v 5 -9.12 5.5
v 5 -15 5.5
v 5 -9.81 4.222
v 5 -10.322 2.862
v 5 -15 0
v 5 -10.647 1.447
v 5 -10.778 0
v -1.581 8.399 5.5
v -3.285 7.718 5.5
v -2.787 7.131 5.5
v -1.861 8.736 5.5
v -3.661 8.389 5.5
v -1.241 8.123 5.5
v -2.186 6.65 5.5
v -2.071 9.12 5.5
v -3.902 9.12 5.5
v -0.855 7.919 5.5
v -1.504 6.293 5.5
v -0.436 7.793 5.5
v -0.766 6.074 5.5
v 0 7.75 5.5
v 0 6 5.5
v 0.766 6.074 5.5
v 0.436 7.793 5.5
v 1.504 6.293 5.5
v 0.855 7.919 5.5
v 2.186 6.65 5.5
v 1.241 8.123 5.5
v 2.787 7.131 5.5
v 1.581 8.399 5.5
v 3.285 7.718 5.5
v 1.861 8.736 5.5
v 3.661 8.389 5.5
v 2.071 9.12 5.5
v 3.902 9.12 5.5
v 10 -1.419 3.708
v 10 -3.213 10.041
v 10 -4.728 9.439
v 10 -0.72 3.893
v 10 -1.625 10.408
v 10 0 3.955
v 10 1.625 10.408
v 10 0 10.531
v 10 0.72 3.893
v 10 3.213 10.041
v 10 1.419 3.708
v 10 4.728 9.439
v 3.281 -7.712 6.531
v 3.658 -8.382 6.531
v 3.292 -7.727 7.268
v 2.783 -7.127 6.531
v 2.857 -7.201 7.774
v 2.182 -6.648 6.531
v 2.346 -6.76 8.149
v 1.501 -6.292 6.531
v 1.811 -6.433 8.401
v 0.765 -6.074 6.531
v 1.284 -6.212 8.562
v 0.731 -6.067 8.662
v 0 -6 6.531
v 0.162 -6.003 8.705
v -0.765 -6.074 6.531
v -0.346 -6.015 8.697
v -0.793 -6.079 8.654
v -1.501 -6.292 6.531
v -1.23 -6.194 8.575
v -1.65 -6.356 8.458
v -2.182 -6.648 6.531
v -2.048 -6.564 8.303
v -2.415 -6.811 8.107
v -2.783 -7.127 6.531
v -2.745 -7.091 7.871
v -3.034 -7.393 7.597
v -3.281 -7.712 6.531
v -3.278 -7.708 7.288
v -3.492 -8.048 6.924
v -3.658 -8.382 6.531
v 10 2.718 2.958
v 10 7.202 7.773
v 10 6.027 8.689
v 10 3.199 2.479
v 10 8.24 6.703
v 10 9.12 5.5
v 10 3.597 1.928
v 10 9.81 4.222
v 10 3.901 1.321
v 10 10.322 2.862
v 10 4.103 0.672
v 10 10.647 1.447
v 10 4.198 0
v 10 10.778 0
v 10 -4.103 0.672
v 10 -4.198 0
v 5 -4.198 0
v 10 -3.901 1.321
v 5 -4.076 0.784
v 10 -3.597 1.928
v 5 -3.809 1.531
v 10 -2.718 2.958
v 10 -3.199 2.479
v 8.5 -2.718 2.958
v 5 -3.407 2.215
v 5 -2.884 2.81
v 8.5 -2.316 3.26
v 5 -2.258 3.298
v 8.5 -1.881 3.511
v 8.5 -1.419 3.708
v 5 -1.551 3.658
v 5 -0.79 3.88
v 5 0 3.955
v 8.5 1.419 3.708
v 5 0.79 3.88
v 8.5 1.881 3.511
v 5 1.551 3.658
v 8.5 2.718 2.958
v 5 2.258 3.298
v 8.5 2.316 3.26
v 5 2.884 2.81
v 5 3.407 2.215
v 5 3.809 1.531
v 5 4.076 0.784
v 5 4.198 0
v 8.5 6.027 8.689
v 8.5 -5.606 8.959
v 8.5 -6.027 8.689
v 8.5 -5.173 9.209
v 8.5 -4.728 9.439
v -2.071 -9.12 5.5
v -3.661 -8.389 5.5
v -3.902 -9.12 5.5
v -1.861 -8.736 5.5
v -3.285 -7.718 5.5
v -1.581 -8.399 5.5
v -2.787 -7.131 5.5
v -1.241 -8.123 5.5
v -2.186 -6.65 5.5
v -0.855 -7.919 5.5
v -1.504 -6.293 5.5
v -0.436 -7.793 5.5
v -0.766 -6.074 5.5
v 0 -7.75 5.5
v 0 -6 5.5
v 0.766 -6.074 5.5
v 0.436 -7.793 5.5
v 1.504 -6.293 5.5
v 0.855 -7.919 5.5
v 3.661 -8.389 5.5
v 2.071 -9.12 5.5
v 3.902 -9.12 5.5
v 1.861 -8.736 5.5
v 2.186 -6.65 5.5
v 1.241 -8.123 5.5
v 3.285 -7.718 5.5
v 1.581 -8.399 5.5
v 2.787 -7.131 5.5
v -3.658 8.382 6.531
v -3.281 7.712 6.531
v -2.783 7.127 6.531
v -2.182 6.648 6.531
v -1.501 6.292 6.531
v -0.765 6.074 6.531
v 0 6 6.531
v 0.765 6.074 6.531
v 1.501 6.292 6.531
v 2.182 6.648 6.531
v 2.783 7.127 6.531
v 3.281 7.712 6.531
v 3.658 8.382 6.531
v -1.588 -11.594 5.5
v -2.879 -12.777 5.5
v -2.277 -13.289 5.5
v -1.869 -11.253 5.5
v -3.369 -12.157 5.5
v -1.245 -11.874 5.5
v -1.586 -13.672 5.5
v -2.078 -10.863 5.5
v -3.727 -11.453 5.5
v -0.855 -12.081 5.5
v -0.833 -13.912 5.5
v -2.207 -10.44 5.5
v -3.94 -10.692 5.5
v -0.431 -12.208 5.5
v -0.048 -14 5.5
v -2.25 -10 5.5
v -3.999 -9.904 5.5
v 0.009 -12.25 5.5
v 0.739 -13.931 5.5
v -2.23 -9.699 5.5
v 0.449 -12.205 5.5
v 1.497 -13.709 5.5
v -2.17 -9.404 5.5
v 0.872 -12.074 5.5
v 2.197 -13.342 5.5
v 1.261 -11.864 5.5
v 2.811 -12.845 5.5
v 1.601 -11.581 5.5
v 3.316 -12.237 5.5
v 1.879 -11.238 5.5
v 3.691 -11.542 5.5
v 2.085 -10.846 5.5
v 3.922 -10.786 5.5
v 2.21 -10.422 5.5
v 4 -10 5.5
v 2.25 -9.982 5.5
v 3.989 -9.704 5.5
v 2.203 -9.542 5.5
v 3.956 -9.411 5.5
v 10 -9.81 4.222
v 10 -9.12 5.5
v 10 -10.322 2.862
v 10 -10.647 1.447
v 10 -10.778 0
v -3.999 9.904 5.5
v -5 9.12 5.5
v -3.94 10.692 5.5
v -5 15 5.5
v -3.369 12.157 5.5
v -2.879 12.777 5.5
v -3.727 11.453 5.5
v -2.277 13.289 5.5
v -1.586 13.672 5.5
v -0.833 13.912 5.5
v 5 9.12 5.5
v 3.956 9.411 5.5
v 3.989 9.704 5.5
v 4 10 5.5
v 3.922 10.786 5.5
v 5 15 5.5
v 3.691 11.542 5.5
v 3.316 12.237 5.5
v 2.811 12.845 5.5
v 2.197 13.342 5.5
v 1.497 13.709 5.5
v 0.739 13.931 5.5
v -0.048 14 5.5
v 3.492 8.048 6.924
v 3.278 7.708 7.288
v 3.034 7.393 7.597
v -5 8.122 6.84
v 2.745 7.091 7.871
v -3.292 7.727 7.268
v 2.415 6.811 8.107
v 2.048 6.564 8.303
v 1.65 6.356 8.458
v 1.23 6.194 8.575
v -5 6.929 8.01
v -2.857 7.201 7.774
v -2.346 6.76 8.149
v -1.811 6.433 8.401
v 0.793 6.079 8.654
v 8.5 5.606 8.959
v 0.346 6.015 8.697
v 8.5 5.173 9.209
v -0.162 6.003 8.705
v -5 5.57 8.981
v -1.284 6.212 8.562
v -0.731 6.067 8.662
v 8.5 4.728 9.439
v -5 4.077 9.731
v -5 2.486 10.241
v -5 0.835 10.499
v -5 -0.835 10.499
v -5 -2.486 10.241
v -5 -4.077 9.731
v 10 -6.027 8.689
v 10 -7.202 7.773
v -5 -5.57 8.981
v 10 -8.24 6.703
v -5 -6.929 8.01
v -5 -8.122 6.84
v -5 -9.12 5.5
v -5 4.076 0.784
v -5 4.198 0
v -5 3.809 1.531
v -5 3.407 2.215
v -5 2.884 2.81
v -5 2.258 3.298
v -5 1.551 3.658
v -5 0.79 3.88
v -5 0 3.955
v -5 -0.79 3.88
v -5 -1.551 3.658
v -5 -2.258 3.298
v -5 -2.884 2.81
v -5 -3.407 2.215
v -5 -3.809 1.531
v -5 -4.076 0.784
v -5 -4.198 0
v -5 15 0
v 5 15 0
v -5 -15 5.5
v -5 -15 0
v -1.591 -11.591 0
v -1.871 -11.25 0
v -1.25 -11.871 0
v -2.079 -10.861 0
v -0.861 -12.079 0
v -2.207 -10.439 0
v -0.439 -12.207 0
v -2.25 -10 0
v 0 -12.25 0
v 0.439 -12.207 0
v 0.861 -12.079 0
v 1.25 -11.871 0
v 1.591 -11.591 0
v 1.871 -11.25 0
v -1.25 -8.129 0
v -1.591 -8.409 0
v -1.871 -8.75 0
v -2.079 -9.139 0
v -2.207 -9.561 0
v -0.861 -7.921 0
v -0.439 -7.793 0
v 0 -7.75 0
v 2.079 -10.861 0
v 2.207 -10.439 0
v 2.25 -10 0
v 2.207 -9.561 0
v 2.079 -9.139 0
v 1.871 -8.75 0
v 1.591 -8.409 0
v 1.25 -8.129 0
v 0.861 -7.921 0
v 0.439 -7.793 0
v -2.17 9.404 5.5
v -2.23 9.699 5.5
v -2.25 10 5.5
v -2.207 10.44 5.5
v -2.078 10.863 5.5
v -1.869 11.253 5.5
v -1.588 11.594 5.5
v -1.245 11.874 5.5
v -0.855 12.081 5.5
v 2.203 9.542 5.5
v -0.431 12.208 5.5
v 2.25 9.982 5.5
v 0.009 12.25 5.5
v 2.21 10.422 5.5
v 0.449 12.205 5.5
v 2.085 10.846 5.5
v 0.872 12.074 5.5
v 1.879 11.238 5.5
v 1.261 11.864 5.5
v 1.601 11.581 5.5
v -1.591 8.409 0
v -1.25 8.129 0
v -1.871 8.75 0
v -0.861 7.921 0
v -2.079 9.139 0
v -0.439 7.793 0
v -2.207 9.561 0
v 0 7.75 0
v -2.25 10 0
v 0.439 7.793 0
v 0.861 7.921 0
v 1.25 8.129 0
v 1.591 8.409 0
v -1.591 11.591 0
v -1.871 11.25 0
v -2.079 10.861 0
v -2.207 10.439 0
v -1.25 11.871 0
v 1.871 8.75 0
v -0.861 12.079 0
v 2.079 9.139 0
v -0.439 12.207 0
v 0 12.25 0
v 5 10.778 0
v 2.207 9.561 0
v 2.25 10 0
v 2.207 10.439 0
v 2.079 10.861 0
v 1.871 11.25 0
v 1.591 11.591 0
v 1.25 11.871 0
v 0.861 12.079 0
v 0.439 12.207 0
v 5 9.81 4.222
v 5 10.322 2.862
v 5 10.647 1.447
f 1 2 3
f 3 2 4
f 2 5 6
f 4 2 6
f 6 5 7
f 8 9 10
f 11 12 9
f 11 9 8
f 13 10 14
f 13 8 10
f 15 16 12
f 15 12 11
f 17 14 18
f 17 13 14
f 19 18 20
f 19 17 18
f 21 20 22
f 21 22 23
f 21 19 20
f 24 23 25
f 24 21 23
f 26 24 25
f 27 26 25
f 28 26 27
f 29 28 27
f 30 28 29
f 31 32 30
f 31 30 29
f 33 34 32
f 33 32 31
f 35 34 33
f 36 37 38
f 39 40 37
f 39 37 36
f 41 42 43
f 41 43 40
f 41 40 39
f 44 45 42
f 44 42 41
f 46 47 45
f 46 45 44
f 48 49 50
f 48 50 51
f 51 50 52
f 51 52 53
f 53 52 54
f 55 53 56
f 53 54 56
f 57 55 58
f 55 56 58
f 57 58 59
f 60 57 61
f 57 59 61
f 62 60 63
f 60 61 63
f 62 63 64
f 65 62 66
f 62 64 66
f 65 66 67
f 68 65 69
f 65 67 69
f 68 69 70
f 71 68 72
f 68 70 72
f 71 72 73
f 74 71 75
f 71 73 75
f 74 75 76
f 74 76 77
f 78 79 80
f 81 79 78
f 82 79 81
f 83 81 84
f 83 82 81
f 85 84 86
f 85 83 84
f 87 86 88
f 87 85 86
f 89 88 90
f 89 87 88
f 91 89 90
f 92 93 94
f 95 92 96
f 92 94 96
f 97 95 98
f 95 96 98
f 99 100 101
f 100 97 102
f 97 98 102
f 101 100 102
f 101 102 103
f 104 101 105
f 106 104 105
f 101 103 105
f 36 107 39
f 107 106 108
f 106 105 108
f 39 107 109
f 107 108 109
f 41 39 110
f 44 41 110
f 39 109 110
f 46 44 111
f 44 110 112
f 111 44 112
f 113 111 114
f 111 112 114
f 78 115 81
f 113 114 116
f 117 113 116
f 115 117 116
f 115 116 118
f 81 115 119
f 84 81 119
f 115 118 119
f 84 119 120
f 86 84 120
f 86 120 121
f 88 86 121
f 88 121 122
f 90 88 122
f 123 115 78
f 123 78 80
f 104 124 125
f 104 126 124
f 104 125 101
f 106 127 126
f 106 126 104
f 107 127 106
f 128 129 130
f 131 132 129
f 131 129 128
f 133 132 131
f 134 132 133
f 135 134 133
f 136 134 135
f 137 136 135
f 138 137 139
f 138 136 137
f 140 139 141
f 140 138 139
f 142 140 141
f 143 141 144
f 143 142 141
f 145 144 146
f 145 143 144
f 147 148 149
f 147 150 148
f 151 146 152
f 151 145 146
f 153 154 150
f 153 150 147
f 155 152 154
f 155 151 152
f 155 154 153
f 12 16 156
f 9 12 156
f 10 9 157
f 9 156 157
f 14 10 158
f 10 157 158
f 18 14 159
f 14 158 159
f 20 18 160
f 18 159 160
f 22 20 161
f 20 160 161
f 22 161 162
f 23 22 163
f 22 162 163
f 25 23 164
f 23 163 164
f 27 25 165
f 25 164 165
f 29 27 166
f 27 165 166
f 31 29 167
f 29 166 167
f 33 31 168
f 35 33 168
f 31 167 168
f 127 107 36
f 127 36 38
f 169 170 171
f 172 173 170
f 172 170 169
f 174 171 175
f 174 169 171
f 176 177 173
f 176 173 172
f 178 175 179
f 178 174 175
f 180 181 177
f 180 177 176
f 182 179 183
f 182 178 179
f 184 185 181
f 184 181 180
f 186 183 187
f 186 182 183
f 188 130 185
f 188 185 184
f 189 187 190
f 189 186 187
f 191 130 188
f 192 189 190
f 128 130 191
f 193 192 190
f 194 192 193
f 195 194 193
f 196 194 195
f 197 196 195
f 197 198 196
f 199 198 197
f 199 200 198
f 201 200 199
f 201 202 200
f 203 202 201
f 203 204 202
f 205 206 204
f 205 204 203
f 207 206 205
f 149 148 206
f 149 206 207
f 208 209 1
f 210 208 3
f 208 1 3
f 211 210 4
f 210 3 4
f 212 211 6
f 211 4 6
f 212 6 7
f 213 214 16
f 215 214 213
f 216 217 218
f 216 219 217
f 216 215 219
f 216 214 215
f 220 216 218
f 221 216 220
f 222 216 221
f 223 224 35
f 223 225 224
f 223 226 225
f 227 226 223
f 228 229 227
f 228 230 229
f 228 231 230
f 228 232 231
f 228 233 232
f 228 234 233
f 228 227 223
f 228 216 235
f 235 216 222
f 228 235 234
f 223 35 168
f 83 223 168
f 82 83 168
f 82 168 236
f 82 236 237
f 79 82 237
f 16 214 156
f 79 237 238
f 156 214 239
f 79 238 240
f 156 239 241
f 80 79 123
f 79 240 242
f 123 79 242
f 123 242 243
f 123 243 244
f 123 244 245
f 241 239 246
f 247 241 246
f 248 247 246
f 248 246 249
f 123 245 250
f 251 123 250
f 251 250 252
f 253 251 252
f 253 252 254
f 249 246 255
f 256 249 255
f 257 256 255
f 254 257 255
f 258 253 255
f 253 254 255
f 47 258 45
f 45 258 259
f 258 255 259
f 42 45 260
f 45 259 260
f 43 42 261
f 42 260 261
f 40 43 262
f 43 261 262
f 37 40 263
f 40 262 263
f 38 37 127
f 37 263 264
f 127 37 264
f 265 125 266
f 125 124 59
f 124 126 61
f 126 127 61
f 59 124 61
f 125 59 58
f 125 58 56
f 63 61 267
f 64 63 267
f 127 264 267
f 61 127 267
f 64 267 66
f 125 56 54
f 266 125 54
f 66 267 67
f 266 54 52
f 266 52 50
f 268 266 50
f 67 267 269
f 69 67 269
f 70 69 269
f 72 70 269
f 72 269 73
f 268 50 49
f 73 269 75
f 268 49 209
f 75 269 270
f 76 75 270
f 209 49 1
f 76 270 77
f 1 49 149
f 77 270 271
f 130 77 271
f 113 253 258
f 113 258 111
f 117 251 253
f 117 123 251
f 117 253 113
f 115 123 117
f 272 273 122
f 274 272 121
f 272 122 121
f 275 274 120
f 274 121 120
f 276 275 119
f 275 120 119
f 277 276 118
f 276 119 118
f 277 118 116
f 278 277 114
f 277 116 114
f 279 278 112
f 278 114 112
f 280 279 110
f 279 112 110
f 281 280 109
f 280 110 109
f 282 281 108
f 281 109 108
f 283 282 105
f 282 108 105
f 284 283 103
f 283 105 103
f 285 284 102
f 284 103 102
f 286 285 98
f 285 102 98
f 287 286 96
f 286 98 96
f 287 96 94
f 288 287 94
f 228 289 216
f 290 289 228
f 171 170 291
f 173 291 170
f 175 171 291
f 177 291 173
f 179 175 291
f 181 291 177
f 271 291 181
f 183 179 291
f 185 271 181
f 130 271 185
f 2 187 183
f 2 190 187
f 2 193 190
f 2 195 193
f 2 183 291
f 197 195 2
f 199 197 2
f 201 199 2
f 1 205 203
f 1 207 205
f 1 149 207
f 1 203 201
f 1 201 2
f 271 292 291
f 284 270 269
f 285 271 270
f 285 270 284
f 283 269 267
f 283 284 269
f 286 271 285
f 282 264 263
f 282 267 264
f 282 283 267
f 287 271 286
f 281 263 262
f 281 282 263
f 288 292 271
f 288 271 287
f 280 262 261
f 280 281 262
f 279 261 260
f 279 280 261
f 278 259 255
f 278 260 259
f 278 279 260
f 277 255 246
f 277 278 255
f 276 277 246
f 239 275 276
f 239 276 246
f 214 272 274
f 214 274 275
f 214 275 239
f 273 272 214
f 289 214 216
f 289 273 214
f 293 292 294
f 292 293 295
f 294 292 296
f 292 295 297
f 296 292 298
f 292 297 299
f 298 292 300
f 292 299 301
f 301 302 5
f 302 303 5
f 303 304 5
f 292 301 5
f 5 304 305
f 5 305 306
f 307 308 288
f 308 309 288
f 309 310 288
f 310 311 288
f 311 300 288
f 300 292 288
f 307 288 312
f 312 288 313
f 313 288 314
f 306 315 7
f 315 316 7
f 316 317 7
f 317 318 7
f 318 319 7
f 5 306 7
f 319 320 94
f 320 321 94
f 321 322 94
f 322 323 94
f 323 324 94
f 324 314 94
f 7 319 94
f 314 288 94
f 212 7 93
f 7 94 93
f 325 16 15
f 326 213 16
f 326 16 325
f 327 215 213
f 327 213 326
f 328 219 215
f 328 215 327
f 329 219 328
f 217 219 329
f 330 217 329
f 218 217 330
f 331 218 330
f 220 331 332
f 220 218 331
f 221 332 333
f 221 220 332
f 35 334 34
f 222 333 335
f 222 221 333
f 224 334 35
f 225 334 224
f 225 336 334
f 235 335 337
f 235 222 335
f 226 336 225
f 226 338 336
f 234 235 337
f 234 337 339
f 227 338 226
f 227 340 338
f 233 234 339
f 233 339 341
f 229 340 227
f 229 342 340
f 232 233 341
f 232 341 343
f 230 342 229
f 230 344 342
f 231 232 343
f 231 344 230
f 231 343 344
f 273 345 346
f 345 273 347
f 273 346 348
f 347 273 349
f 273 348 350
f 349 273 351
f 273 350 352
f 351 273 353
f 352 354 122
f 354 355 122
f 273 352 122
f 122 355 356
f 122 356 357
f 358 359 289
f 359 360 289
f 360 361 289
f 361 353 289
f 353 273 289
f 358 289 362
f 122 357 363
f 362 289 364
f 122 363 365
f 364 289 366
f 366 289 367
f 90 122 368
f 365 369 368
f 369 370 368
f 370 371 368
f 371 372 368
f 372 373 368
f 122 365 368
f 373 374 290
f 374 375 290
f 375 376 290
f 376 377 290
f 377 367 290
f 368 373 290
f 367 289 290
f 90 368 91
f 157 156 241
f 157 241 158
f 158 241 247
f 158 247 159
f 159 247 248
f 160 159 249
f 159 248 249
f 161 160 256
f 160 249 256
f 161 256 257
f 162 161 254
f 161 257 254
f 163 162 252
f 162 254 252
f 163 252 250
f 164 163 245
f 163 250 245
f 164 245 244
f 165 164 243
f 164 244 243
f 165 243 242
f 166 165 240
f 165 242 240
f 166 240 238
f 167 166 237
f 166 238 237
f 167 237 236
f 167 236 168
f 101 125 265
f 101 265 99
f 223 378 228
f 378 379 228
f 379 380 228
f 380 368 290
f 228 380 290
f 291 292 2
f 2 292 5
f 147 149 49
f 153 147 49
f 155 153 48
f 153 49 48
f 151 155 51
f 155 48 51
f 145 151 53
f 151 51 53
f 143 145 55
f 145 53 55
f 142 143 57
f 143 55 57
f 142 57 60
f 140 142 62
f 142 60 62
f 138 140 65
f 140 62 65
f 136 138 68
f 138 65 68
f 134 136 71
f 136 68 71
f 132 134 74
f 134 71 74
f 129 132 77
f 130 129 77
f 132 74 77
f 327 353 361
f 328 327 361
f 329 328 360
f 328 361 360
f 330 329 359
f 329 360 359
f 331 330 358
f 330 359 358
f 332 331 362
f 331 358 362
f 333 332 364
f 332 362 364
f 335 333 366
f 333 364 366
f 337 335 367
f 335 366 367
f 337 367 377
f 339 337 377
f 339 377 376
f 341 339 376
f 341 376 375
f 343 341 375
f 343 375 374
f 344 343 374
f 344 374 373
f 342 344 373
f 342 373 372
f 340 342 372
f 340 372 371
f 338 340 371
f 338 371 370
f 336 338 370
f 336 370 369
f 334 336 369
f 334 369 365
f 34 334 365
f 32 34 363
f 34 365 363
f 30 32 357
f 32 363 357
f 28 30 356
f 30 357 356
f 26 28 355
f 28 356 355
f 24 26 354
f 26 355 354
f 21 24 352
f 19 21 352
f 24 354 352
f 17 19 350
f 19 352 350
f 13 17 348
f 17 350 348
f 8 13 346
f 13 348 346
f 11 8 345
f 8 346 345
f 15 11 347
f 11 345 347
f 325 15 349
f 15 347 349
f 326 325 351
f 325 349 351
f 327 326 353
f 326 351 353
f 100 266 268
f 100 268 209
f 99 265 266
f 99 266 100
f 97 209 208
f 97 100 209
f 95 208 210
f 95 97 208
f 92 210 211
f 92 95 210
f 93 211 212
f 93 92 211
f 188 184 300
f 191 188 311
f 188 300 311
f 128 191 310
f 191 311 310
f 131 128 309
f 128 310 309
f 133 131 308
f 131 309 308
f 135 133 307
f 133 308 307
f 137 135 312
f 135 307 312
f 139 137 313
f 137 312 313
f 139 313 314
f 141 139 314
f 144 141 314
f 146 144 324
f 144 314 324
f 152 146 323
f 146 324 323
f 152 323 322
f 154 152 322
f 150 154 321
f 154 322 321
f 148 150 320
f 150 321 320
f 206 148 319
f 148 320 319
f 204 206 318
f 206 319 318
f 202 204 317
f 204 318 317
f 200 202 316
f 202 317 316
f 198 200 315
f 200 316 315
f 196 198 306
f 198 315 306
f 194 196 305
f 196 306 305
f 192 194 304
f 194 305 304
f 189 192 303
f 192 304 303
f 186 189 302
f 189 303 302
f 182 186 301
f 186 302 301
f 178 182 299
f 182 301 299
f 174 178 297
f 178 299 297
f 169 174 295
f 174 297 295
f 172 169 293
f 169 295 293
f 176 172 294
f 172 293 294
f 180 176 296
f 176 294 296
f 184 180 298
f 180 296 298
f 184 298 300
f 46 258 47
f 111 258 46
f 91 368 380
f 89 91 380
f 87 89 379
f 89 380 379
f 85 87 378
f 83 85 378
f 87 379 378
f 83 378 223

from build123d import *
from build123d.topology import SkipClean

# Parameters (mm, degrees)
SKETCH1_W                      = 10
SKETCH1_H                      = 30
BOSS_EXTRUDE1_DEPTH            = 5.5
SKETCH2_R                      = 4.205
CUT_EXTRUDE1_DEPTH             = 19.848077
BOSS_EXTRUDE2_START            = -10
BOSS_EXTRUDE2_DEPTH            = 15
CUT_EXTRUDE_THIN1_DEPTH        = 24.683484
CUT_EXTRUDE_THIN1_DEPTH_BACK   = 1.5
CUT_EXTRUDE_THIN2_DEPTH        = 24.683484
CUT_EXTRUDE_THIN2_DEPTH_BACK   = 1.5
CBORE_FOR_M4_SHCS1_D           = 4.5
CBORE_FOR_M4_SHCS1_CBORE_D     = 8
CBORE_FOR_M4_SHCS1_CBORE_DEPTH = 4
SKETCH22_R                     = 4
CUT_EXTRUDE2_DEPTH             = 1.03126


with BuildPart() as part:
    # Sketch1 → Boss-Extrude1 (new body)
    with BuildSketch(Plane.XY):
        Rectangle(SKETCH1_W, SKETCH1_H)
    extrude(amount=BOSS_EXTRUDE1_DEPTH)

    # Sketch2 → Cut-Extrude1 (cut, through all)
    with BuildSketch(Plane(origin=(5, 0, 0), x_dir=(0, 0, -1), z_dir=(1, 0, 0))):
        with Locations((0.25, 0)):
            Circle(SKETCH2_R)
    extrude(amount=-CUT_EXTRUDE1_DEPTH, mode=Mode.SUBTRACT)

    # Sketch9 → Boss-Extrude2 (add)
    with SkipClean():  # the faces are left unmerged after this step: merging them gives an invalid solid
        with BuildSketch(Plane(origin=(5, 0, 0), x_dir=(0, 0, -1), z_dir=(1, 0, 0)).offset(BOSS_EXTRUDE2_START)):
            with BuildLine():
                ThreePointArc((-5.5, -9.119927), (-2.862491, -10.322207), (0, -10.778361))
                Line((0, -10.778361), (0, -4.197562))
                ThreePointArc((0, -4.197562), (-3.955, 0), (0, 4.197562))
                Line((0, 4.197562), (0, 10.778361))
                ThreePointArc((0, 10.778361), (-2.862491, 10.322207), (-5.5, 9.119927))
                Line((-5.5, 9.119927), (-5.5, -9.119927))
            make_face()
            with BuildLine():
                ThreePointArc((-5.5, 9.119927), (-10.53126, 0), (-5.5, -9.119927))
                Line((-5.5, -9.119927), (-5.5, 9.119927))
            make_face()
        extrude(amount=BOSS_EXTRUDE2_DEPTH)

    # Sketch12 → Cut-Extrude-Thin1 (cut, two sides: drawn at the far end of the back side and taken through both)
    with SkipClean():  # the faces are left unmerged after this step: merging them gives an invalid solid
        with BuildSketch(Plane(origin=(10, 0, 0), x_dir=(0, 0, -1), z_dir=(1, 0, 0)).offset(-CUT_EXTRUDE_THIN1_DEPTH_BACK)):
            Polygon((-0.125, 0.649519), (-9.461845, -4.741111), (-8.711845, -6.040149), (0.625, -0.649519), align=None)
        extrude(amount=CUT_EXTRUDE_THIN1_DEPTH + CUT_EXTRUDE_THIN1_DEPTH_BACK, mode=Mode.SUBTRACT)

    # Sketch21 → Cut-Extrude-Thin2 (cut, two sides: drawn at the far end of the back side and taken through both)
    with SkipClean():  # the faces are left unmerged after this step: merging them gives an invalid solid
        with BuildSketch(Plane(origin=(10, 0, 0), x_dir=(0, 0, -1), z_dir=(1, 0, 0)).offset(-CUT_EXTRUDE_THIN2_DEPTH_BACK)):
            Polygon((0.625, 0.649519), (-8.711845, 6.040149), (-9.461845, 4.741111), (-0.125, -0.649519), align=None)
        extrude(amount=CUT_EXTRUDE_THIN2_DEPTH + CUT_EXTRUDE_THIN2_DEPTH_BACK, mode=Mode.SUBTRACT)

    # CBORE for M4 SHCS1 (through all)
    with Locations(Plane.XY.offset(10.53126)):
        with Locations((0, 10), (0, -10)):
            CounterBoreHole(CBORE_FOR_M4_SHCS1_D / 2, CBORE_FOR_M4_SHCS1_CBORE_D / 2, CBORE_FOR_M4_SHCS1_CBORE_DEPTH)

    # Sketch22 → Cut-Extrude2 (cut)
    with SkipClean():  # the faces are left unmerged after this step: merging them gives an invalid solid
        with BuildSketch(Plane.XY.offset(6.53126)):
            with Locations((0, 10)):
                Circle(SKETCH22_R)
            with Locations((0, -10)):
                Circle(SKETCH22_R)
        extrude(amount=-CUT_EXTRUDE2_DEPTH, mode=Mode.SUBTRACT)


solid = part.part
